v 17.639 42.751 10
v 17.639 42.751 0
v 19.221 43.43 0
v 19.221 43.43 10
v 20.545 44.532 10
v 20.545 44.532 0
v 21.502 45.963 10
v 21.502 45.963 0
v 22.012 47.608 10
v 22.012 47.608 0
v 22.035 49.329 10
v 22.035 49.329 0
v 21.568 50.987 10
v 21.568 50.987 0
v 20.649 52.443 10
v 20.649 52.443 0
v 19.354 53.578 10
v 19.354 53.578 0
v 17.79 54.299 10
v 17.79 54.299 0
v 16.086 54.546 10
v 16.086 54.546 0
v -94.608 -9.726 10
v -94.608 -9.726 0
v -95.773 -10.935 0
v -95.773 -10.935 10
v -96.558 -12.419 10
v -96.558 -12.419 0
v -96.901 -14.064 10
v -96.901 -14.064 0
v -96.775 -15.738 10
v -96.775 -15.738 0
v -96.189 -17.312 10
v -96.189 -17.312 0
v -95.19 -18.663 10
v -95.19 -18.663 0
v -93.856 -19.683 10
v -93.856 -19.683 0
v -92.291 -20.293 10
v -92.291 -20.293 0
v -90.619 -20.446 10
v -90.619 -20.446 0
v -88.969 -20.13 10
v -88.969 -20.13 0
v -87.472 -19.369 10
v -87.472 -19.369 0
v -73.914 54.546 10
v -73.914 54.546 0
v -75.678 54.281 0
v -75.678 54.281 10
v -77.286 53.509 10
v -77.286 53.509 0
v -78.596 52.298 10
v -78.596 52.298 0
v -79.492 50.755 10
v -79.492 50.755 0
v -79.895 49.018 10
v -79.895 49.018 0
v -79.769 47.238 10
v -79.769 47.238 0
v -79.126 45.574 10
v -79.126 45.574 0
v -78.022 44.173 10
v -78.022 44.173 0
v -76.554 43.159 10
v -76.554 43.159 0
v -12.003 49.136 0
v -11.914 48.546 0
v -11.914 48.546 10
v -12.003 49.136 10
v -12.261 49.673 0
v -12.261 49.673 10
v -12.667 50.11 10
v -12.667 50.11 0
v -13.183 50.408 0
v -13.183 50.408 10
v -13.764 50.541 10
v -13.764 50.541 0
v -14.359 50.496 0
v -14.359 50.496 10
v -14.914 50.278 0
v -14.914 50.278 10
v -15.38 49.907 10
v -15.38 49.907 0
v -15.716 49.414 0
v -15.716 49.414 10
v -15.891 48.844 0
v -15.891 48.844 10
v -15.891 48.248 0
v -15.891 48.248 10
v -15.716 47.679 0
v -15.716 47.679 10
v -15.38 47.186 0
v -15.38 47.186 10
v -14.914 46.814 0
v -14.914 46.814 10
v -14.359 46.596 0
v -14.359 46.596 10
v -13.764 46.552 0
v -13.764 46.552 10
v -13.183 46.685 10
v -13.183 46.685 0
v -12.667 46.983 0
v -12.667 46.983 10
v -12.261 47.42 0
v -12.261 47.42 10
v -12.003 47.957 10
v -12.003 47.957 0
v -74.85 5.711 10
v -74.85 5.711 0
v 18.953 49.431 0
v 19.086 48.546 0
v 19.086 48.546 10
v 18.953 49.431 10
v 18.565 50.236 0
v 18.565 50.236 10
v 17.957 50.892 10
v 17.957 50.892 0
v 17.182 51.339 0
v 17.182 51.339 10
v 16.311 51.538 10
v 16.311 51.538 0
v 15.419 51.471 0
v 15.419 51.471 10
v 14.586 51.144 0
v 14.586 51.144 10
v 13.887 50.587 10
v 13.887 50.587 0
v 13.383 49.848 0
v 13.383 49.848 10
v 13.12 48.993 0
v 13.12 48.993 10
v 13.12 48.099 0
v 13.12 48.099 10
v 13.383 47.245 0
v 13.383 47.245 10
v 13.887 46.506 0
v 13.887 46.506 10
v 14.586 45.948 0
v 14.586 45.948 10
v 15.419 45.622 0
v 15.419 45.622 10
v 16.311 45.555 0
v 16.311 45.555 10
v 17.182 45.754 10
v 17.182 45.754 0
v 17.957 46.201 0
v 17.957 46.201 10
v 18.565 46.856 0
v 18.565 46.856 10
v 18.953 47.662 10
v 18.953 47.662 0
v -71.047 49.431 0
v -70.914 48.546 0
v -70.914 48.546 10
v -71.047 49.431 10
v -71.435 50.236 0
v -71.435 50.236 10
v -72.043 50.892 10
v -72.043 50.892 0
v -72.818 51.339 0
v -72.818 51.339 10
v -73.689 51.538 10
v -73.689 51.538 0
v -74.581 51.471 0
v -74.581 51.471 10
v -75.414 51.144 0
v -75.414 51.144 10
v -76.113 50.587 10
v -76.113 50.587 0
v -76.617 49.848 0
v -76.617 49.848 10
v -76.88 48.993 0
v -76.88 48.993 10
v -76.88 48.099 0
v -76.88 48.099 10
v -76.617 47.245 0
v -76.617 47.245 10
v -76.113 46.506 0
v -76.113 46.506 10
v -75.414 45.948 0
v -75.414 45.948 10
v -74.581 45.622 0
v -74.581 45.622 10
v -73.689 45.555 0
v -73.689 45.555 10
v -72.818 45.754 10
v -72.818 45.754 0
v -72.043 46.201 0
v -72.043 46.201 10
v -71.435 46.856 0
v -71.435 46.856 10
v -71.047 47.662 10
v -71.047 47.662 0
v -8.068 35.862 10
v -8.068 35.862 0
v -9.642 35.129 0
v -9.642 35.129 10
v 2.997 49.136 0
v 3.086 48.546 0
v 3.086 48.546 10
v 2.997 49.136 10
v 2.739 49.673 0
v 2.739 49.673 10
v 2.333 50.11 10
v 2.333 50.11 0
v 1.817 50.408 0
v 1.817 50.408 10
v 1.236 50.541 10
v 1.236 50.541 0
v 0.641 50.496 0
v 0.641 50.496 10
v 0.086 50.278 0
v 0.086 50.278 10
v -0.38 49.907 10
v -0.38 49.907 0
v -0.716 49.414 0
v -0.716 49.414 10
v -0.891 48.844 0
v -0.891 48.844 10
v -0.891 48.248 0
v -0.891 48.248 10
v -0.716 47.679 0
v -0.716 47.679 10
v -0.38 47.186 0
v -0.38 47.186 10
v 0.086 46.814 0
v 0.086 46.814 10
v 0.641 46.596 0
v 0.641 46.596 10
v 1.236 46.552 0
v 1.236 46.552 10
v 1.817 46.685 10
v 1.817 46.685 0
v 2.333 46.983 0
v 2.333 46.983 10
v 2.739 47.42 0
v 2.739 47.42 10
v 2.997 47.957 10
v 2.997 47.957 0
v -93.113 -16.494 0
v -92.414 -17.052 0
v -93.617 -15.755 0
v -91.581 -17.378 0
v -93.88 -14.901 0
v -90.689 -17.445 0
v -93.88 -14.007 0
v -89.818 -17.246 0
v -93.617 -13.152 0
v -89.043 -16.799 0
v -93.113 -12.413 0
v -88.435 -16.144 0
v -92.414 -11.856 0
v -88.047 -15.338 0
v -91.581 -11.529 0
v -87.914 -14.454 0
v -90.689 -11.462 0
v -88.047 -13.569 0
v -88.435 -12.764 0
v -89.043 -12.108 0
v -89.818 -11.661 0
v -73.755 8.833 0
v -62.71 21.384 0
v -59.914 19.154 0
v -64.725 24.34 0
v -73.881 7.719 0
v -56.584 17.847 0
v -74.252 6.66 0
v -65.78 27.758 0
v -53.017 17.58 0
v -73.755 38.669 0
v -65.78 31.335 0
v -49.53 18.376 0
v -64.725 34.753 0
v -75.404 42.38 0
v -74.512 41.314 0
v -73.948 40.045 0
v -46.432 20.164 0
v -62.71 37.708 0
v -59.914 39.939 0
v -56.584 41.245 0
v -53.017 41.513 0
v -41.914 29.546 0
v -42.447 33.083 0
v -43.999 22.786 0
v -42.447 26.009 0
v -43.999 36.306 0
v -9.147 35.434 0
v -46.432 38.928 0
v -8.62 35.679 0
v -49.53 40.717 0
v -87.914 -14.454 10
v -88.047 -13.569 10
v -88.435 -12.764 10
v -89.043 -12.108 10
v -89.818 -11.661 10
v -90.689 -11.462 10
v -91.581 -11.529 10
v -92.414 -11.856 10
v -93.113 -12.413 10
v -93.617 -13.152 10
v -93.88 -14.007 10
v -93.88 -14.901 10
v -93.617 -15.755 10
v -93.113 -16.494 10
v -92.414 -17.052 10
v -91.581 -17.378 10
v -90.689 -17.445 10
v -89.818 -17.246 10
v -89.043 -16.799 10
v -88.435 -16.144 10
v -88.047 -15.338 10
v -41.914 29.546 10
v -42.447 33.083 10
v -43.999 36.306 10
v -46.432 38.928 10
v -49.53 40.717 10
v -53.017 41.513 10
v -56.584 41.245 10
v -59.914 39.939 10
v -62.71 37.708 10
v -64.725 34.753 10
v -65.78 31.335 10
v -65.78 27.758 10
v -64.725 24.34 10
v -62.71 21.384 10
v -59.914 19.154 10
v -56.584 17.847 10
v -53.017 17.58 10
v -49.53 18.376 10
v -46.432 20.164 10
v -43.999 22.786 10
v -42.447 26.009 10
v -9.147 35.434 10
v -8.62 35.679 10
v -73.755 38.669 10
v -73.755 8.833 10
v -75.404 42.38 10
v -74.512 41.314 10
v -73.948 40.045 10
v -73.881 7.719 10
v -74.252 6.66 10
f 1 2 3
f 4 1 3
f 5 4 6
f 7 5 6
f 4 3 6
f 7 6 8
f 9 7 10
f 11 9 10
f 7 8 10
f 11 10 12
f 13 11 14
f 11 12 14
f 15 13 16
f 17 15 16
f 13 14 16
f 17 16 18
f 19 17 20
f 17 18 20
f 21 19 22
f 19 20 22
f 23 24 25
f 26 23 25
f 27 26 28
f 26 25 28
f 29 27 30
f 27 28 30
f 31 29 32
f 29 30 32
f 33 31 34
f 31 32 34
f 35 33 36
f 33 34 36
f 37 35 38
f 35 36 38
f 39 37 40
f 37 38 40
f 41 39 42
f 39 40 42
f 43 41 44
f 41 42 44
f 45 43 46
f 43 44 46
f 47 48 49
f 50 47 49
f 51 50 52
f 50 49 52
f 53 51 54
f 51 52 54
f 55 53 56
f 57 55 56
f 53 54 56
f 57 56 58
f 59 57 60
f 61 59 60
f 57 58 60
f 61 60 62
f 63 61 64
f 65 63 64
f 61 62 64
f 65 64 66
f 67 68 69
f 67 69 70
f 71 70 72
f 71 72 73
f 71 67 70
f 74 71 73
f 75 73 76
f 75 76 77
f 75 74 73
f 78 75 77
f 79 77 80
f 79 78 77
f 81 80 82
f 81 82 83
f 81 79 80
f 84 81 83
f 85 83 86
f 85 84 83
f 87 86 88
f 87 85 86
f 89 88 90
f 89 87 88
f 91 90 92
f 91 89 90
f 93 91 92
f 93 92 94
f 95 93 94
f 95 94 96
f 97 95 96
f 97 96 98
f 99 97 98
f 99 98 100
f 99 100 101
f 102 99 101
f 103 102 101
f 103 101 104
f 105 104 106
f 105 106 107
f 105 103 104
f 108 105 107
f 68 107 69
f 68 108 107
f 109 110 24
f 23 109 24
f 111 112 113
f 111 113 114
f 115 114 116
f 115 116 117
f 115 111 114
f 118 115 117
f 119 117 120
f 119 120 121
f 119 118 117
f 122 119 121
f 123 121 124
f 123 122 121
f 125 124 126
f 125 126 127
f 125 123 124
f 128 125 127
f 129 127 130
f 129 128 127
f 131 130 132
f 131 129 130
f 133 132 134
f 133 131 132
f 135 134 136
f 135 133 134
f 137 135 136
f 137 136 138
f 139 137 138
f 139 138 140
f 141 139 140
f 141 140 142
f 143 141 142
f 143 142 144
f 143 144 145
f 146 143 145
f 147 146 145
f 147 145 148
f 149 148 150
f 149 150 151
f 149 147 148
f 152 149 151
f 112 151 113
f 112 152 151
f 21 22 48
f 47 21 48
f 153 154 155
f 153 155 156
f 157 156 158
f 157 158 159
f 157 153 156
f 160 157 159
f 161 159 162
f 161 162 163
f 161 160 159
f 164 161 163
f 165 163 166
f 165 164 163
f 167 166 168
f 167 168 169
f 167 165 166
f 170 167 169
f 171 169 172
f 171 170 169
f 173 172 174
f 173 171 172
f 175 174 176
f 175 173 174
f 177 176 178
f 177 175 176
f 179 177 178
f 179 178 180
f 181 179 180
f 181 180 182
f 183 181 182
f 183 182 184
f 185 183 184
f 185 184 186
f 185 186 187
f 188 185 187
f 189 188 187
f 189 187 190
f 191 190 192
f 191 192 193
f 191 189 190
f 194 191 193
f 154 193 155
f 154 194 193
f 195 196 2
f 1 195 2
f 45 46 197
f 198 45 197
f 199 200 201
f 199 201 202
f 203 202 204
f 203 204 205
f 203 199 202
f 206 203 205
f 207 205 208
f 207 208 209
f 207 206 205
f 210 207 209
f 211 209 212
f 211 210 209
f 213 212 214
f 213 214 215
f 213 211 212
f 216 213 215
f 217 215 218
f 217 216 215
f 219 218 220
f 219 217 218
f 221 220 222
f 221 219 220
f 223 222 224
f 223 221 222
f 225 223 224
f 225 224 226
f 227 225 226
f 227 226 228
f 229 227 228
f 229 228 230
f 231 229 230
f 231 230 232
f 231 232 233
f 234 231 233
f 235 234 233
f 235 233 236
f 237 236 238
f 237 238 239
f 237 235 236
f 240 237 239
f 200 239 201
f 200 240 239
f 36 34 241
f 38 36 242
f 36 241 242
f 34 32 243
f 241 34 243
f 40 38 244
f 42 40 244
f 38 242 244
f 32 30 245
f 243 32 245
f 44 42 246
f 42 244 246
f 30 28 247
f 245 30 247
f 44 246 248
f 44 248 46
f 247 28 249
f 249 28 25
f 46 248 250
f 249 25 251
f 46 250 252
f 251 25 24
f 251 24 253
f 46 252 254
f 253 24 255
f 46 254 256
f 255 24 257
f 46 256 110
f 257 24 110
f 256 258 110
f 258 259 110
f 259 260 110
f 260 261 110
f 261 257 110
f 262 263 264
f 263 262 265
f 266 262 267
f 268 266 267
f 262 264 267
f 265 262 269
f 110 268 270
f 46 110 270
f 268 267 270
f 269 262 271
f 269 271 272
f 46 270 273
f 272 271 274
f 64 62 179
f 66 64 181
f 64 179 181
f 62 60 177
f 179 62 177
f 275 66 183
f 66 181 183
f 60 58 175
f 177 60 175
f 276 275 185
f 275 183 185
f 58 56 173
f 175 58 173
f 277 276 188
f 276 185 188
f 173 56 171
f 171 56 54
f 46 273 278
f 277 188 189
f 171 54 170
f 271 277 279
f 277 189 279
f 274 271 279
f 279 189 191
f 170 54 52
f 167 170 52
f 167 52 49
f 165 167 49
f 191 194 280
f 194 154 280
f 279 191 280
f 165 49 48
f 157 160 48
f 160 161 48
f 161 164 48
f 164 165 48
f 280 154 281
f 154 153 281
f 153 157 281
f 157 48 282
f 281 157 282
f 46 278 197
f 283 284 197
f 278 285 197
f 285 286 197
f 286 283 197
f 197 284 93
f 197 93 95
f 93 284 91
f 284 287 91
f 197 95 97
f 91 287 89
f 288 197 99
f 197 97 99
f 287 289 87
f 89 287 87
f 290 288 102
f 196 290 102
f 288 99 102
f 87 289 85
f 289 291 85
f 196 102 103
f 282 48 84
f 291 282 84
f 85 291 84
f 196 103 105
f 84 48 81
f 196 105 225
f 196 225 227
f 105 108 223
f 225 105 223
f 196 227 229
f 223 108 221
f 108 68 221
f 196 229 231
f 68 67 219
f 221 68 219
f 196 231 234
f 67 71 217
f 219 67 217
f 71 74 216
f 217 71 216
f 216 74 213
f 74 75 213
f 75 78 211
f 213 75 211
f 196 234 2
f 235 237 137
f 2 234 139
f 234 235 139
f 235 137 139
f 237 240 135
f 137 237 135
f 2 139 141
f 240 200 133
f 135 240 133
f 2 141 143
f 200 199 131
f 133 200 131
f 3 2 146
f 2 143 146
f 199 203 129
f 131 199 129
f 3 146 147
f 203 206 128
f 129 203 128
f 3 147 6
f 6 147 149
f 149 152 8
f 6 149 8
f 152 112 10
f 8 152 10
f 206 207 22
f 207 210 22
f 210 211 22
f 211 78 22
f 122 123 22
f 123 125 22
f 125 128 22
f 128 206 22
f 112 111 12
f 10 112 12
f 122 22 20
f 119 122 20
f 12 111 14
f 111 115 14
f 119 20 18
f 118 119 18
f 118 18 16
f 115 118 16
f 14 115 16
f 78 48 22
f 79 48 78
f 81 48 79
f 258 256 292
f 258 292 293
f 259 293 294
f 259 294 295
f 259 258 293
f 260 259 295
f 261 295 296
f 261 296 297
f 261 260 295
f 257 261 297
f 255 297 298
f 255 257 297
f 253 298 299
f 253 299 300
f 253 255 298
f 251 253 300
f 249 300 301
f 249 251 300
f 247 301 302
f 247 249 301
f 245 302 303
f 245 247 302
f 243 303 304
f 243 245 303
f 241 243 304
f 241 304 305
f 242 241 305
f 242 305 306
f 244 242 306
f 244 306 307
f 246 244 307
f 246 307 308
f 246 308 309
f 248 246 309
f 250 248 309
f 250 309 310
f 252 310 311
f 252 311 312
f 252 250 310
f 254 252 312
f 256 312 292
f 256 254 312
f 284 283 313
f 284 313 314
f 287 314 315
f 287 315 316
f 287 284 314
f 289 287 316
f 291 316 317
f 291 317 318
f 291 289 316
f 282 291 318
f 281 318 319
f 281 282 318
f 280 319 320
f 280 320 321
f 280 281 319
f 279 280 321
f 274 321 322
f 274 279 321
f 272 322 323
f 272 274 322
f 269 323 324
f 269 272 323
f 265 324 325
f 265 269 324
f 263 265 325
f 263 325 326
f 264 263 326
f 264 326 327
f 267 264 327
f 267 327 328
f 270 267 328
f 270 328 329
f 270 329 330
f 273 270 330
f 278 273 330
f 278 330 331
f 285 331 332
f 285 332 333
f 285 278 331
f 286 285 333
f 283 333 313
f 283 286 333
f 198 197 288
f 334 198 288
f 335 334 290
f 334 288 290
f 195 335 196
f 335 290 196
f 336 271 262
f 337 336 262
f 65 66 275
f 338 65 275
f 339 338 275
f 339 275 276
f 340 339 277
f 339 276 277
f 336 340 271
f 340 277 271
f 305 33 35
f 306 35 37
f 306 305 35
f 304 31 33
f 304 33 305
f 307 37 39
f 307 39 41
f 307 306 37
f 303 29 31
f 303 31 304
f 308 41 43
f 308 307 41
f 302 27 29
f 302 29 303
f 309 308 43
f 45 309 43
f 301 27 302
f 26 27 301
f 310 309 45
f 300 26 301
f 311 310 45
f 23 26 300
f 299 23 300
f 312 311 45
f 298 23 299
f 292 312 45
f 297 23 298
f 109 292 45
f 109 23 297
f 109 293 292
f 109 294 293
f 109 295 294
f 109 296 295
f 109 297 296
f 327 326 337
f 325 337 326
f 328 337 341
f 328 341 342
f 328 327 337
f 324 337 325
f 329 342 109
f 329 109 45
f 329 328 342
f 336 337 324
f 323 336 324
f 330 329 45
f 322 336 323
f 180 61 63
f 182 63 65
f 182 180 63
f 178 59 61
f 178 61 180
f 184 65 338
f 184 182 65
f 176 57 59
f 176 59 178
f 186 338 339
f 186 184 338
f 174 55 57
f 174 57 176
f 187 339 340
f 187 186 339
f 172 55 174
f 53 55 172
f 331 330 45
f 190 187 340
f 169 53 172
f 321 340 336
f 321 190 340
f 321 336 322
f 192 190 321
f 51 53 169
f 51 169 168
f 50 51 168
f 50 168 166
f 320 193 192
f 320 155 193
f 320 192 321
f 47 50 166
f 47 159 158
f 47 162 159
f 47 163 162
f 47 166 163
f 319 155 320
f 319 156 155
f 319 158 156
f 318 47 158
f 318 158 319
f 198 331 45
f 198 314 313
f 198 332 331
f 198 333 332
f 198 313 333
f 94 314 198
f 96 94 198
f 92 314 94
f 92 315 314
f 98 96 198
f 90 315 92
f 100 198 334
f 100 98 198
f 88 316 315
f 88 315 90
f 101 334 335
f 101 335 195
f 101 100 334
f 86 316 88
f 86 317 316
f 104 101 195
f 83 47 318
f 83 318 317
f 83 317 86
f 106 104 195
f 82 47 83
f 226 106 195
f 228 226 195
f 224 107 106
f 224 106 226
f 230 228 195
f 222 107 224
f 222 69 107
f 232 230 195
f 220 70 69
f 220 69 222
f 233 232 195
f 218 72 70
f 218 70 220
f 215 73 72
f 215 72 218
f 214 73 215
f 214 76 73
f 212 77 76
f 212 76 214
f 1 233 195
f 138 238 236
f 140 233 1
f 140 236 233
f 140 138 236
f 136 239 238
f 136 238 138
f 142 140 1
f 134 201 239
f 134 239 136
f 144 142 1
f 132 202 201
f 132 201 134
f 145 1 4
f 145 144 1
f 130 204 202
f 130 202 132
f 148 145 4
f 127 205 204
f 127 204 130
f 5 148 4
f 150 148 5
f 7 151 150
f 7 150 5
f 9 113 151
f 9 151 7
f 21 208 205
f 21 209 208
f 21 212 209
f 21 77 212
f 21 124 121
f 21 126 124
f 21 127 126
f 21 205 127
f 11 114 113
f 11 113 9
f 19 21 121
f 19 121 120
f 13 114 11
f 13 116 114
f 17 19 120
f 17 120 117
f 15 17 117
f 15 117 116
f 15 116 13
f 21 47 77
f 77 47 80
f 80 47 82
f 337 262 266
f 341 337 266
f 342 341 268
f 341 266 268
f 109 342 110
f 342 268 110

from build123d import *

# Parameters (mm, degrees)
SKETCH2_R           = 3
SKETCH2_R_2         = 2
SKETCH2_R_3         = 12
BOSS_EXTRUDE1_DEPTH = 10


with BuildPart() as part:
    # Sketch2 → Boss-Extrude1 (new body)
    with BuildSketch(Plane.XY):
        with BuildLine():
            Line((16.086311, 54.546287057), (-73.913689, 54.546287057))
            ThreePointArc((-73.913689, 54.546287057), (-79.758605223, 49.901629949), (-76.554310886, 43.158605175))
            ThreePointArc((-76.554310886, 43.158605175), (-74.512035752, 41.314376729), (-73.754829124, 38.668870274))
            Line((-73.754829124, 38.668870274), (-73.754829124, 8.833412185))
            ThreePointArc((-73.754829124, 8.833412185), (-74.03645611, 7.179037348), (-74.849611564, 5.711029151))
            Line((-74.849611564, 5.711029151), (-94.607657852, -9.725648422))
            ThreePointArc((-94.607657852, -9.725648422), (-95.736830164, -18.022649664), (-87.472230382, -19.368625209))
            Line((-87.472230382, -19.368625209), (-9.642261307, 35.128505836))
            ThreePointArc((-9.642261307, 35.128505836), (-8.887470434, 35.56428455), (-8.06847435, 35.862374746))
            Line((-8.06847435, 35.862374746), (17.63922527, 42.750732099))
            ThreePointArc((17.63922527, 42.750732099), (22.034980168, 49.32944421), (16.086311, 54.546287057))
        make_face()
        with Locations((16.086311, 48.546287057)):
            Circle(SKETCH2_R, mode=Mode.SUBTRACT)
        with Locations((1.086311, 48.546287057)):
            Circle(SKETCH2_R_2, mode=Mode.SUBTRACT)
        with Locations((-13.913689, 48.546287057)):
            Circle(SKETCH2_R_2, mode=Mode.SUBTRACT)
        with Locations((-73.913689, 48.546287057)):
            Circle(SKETCH2_R, mode=Mode.SUBTRACT)
        with Locations((-90.913689, -14.453712943)):
            Circle(SKETCH2_R, mode=Mode.SUBTRACT)
        with Locations((-53.913689, 29.546287057)):
            Circle(SKETCH2_R_3, mode=Mode.SUBTRACT)
    extrude(amount=BOSS_EXTRUDE1_DEPTH)


solid = part.part
